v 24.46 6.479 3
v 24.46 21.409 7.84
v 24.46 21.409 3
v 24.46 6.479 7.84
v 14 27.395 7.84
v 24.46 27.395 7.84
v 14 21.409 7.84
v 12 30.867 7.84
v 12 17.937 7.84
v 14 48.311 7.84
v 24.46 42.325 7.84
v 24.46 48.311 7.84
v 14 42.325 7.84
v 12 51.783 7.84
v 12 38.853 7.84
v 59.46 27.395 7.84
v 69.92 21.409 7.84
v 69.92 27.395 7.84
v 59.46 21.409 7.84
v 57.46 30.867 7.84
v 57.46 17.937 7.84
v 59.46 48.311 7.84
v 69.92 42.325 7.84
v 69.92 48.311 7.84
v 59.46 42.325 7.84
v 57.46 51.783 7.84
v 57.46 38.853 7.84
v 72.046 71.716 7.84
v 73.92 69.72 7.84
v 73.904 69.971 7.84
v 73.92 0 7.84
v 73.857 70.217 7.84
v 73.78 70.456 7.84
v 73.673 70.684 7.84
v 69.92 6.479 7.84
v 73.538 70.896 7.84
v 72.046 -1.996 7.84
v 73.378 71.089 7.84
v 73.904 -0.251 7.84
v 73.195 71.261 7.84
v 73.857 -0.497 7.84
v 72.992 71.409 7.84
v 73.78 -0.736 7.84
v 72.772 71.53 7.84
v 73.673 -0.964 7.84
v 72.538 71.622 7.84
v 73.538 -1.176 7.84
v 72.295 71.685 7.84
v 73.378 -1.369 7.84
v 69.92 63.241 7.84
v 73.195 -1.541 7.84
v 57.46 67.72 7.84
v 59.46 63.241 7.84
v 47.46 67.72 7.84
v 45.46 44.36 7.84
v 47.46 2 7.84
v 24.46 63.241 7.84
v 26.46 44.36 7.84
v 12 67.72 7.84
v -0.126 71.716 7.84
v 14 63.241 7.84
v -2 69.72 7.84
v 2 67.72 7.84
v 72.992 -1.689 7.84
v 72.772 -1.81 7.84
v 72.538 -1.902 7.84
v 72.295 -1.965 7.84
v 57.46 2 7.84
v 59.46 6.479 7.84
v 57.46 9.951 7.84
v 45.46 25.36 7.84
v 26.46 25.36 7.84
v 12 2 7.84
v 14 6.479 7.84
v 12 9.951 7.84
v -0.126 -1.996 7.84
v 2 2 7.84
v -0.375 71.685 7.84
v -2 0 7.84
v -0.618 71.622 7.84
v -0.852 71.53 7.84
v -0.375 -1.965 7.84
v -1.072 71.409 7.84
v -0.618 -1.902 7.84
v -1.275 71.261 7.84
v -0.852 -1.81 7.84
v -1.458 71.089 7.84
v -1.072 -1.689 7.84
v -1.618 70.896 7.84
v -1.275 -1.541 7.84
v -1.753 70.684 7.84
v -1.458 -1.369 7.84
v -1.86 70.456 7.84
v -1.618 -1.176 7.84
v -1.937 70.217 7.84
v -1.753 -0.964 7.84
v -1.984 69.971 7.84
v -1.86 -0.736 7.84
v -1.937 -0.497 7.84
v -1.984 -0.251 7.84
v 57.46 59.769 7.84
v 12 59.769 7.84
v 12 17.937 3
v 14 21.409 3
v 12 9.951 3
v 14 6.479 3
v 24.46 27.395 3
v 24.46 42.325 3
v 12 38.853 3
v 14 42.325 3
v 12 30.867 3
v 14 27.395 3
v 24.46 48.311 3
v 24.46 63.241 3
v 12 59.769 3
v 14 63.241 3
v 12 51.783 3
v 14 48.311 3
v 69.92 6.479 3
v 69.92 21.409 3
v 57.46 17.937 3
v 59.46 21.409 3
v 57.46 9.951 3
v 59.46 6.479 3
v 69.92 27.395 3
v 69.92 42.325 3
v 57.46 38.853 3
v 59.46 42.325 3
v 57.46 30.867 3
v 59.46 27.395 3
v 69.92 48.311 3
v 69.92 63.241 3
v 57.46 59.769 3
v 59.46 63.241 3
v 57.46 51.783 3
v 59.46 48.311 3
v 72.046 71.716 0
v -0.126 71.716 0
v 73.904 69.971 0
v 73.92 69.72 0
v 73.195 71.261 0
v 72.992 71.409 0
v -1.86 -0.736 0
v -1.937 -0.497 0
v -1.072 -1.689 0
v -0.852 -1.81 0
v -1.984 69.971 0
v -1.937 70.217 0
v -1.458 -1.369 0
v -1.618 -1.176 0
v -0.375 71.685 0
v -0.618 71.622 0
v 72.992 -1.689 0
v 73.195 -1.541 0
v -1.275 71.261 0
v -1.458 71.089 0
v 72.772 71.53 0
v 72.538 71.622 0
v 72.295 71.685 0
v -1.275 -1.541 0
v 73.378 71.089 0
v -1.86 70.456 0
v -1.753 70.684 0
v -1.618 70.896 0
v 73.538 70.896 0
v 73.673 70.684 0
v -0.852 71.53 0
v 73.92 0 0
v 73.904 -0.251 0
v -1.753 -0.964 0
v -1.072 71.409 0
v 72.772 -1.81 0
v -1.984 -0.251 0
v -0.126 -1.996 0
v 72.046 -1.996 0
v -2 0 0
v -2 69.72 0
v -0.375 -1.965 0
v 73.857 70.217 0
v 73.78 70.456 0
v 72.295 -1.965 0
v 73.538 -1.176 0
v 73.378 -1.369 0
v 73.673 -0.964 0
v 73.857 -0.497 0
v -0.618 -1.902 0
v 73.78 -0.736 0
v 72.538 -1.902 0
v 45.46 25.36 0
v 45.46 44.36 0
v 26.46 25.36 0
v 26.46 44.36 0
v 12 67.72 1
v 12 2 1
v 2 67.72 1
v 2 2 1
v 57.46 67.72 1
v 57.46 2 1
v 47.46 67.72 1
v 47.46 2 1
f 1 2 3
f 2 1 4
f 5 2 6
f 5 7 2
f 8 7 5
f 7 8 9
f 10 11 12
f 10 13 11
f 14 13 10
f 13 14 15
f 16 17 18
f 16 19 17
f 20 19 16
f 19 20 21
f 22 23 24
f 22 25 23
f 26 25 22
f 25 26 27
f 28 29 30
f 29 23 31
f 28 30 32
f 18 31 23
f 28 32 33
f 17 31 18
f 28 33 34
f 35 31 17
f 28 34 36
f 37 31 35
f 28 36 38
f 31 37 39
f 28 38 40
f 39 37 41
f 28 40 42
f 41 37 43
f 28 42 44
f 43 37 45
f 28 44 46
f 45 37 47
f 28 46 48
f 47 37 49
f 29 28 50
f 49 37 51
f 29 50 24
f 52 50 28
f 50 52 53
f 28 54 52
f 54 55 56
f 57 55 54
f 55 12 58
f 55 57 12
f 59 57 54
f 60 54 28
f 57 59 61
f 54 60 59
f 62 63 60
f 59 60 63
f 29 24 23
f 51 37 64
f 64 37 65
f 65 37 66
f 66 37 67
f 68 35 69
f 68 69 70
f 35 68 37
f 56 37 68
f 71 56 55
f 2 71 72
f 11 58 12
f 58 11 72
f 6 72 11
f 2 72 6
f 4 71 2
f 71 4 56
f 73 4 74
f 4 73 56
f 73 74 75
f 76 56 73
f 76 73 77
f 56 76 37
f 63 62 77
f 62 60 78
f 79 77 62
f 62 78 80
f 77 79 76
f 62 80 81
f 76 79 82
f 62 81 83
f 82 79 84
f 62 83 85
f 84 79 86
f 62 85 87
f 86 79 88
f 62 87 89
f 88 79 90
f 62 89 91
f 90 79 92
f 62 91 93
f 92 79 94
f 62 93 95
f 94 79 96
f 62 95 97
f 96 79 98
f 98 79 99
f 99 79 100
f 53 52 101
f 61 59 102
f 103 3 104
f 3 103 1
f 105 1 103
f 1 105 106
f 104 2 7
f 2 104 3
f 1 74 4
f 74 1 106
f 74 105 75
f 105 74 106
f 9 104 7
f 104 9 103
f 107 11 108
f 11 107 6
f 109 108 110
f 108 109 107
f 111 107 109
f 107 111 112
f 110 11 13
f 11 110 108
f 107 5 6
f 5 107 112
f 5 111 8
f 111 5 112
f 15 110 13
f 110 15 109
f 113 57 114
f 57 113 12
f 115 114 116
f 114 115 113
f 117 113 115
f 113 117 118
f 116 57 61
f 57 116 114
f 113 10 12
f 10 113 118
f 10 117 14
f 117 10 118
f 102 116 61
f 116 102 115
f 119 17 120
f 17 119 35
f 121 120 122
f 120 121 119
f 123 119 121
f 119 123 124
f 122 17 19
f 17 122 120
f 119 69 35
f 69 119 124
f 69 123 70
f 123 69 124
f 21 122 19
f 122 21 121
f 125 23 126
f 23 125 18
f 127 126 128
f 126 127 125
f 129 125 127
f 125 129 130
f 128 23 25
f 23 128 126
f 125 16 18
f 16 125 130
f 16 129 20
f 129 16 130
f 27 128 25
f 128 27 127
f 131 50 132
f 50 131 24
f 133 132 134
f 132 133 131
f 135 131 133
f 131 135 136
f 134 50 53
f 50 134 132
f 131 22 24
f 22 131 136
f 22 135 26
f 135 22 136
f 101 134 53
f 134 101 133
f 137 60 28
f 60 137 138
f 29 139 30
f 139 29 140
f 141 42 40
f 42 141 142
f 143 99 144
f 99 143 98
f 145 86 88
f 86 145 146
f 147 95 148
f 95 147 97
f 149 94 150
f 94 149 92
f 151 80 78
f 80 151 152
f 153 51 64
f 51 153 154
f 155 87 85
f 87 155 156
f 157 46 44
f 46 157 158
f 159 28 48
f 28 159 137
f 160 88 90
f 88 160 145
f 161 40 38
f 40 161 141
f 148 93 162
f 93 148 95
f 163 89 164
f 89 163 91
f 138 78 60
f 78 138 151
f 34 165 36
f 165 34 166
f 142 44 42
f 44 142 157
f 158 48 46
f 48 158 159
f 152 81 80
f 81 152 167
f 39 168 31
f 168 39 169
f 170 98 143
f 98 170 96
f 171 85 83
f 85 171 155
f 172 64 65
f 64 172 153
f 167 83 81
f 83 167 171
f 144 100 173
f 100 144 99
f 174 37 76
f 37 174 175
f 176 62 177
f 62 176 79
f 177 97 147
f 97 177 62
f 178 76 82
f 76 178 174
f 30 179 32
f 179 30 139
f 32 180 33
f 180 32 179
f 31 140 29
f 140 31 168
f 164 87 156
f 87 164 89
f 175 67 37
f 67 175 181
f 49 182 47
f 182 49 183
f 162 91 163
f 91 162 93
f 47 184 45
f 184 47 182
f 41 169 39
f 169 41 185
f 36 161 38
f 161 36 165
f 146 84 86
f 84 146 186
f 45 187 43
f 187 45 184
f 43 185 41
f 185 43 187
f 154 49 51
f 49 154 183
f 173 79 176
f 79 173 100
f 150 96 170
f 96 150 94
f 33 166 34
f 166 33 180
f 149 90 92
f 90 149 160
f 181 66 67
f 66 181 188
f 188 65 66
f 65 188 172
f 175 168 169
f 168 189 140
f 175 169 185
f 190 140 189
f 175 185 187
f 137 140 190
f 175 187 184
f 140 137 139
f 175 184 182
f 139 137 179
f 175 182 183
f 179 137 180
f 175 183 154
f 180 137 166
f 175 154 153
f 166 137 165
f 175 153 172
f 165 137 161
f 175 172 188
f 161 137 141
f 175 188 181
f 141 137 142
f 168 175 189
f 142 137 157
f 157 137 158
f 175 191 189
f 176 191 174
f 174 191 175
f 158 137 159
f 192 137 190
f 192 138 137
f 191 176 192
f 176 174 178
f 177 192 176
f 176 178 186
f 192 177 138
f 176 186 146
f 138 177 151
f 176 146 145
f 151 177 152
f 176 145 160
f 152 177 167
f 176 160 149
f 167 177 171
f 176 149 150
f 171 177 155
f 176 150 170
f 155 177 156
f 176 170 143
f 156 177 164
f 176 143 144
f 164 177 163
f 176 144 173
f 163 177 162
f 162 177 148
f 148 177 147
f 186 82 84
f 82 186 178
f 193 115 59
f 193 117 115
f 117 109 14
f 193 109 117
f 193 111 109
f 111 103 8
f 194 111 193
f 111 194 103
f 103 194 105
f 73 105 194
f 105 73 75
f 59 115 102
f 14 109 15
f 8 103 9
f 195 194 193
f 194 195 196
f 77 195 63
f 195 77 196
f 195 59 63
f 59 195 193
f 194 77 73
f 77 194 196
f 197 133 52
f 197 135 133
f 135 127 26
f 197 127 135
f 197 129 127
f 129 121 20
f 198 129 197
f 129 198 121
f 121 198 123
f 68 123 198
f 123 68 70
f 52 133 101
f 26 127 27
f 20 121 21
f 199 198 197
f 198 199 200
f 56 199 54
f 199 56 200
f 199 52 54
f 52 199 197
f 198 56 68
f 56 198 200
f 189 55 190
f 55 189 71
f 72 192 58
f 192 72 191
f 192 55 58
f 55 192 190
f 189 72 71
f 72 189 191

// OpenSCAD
// file: SquareWithTrianglePileLib.scad
module LeftPile(wallThickness, totalHeight, singlePileHeight, singlePileWidth, singlePileLength, pileCount, openingSizePercent = .5){
    pileHeight = (pileCount * singlePileHeight) + .5;
    lengthOpeningSize = .00001;
    widthOpeningSize = singlePileWidth * openingSizePercent;
    blockerSize = (singlePileWidth - widthOpeningSize) / 2;
    
    translate([wallThickness, wallThickness, totalHeight - pileHeight])
        cube([singlePileLength, singlePileWidth, pileHeight]);
    
    y = singlePileWidth;
    a = 4.3;
    height = pileHeight;
    translate([wallThickness, wallThickness, totalHeight - pileHeight])
        rotate([0,0,90])
            polyhedron(
                points = 
                [
                    [0,0,0],
                    [y,0,0],
                    [y/2,a,0],
                    [0,0,height],
                    [y,0,height],
                    [y/2,a,height],
                ],
                faces = 
                [
                    [0,1,2],
                    [3,4,1,0],
                    [3,5,4],
                    [4,5,2,1],
                    [5,3,0,2]
                ]);   
    
//    translate([-.00001, wallThickness + (blockerSize), 0])
//        cube([wallThickness + lengthOpeningSize, widthOpeningSize, totalHeight]);
}

module RightPile(wallThickness, totalHeight, singlePileHeight, singlePileWidth, singlePileLength, pileCount, openingSizePercent = .75){
    translate([0, wallThickness + wallThickness + singlePileWidth, 0])
        rotate([0, 0, 180])
            LeftPile(wallThickness, totalHeight, singlePileHeight, singlePileWidth, singlePileLength, pileCount, openingSizePercent);
}

module BottomPile(wallThickness, totalHeight, singlePileHeight, singlePileWidth, singlePileLength, pileCount, openingSizePercent = .75){
    translate([wallThickness + wallThickness + singlePileWidth, 0, 0])
        rotate([0, 0, 90])
            LeftPile(wallThickness, totalHeight, singlePileHeight, singlePileWidth, singlePileLength, pileCount, openingSizePercent);
}

module TopPile(wallThickness, totalHeight, singlePileHeight, singlePileWidth, singlePileLength, pileCount, openingSizePercent = .75){
        rotate([0, 0, 270])
            LeftPile(wallThickness, totalHeight, singlePileHeight, singlePileWidth, singlePileLength, pileCount, openingSizePercent);
}
// file: SpaceAlertThreatTokensLib.scad
include<SquareWithTrianglePileLib.scad>
//side of triangle: 7.85
//sin x = o/h = 
singleThreatTokenPileHeight = 2.17;
singleThreatTokenPileWidth = 14.23 + .7;
singleThreatTokenPileLength = 9.76 + .7;

module LeftThreatTokenPile(wallThickness, totalHeight, threatTokenPileCount){
    LeftPile(
        wallThickness,
        totalHeight,
        singleThreatTokenPileHeight,
        singleThreatTokenPileWidth,
        singleThreatTokenPileLength,
        threatTokenPileCount);
}

module RightThreatTokenPile(wallThickness, totalHeight, threatTokenPileCount){
    RightPile(
        wallThickness,
        totalHeight,
        singleThreatTokenPileHeight,
        singleThreatTokenPileWidth,
        singleThreatTokenPileLength,
        threatTokenPileCount);
}

module BottomThreatTokenPile(wallThickness, totalHeight, threatTokenPileCount){
    BottomPile(
        wallThickness,
        totalHeight,
        singleThreatTokenPileHeight,
        singleThreatTokenPileWidth,
        singleThreatTokenPileLength,
        threatTokenPileCount);
}

module TopThreatTokenPile(wallThickness, totalHeight, threatTokenPileCount){
    TopPile(
        wallThickness,
        totalHeight,
        singleThreatTokenPileHeight,
        singleThreatTokenPileWidth,
        singleThreatTokenPileLength,
        threatTokenPileCount);
}

function threatTokenPileHeight(threatTokenPileCount) =
    (threatTokenPileCount * singleThreatTokenPileHeight) + .5;
// main file
/*
current box: 29.1 height, 137.19x115.53
*/

include<SpaceAlertThreatTokensLib.scad>
fingerNotchLength = 10;
fingerNotchHeight = 1;
floorThickness = 3;
height = threatTokenPileHeight(2) + floorThickness;
echo("height: ",height);
wallThickness = 2;
actualWallThickness = 2;
magnetBaseInnerDiameter = 19;
magnetHeight = 4.0;
length = singleThreatTokenPileLength * 2 + wallThickness * 6 + (fingerNotchLength * 2) + magnetBaseInnerDiameter;
width = singleThreatTokenPileWidth * 4 + actualWallThickness * 3 + wallThickness * 2;
echo("length",length);
echo ("width",width);


difference() {
    
    
    $fn=50;
    minkowski()
    {
      cube([length, width, height - 1]);
      cylinder(r=2,h=1);
    }
    for(a=[1,2.5,4])
        translate([fingerNotchLength + wallThickness, a * width/5 - (singleThreatTokenPileWidth)/2 - wallThickness, 0])
            LeftThreatTokenPile(wallThickness, height, 2);
    
    translate([wallThickness, wallThickness, fingerNotchHeight])
        cube([fingerNotchLength, width - wallThickness * 2, height - fingerNotchHeight]);
        
    for(a=[1,2.5,4])
        translate([length - (singleThreatTokenPileLength + wallThickness * 2), a * width/5 - (singleThreatTokenPileWidth)/2 - wallThickness, 0])
            LeftThreatTokenPile(wallThickness, height, 2);

    translate([length - (singleThreatTokenPileLength + wallThickness * 2) - fingerNotchLength, wallThickness, fingerNotchHeight])
        cube([fingerNotchLength, width - wallThickness * 2, height - fingerNotchHeight]);

  
    translate([length/2 - magnetBaseInnerDiameter/2, width/2 - magnetBaseInnerDiameter/2, 0])
        cube([magnetBaseInnerDiameter, magnetBaseInnerDiameter, height]);
    
    
    
//    translate([100 - (15.05 + .8), 0, 0])

}
